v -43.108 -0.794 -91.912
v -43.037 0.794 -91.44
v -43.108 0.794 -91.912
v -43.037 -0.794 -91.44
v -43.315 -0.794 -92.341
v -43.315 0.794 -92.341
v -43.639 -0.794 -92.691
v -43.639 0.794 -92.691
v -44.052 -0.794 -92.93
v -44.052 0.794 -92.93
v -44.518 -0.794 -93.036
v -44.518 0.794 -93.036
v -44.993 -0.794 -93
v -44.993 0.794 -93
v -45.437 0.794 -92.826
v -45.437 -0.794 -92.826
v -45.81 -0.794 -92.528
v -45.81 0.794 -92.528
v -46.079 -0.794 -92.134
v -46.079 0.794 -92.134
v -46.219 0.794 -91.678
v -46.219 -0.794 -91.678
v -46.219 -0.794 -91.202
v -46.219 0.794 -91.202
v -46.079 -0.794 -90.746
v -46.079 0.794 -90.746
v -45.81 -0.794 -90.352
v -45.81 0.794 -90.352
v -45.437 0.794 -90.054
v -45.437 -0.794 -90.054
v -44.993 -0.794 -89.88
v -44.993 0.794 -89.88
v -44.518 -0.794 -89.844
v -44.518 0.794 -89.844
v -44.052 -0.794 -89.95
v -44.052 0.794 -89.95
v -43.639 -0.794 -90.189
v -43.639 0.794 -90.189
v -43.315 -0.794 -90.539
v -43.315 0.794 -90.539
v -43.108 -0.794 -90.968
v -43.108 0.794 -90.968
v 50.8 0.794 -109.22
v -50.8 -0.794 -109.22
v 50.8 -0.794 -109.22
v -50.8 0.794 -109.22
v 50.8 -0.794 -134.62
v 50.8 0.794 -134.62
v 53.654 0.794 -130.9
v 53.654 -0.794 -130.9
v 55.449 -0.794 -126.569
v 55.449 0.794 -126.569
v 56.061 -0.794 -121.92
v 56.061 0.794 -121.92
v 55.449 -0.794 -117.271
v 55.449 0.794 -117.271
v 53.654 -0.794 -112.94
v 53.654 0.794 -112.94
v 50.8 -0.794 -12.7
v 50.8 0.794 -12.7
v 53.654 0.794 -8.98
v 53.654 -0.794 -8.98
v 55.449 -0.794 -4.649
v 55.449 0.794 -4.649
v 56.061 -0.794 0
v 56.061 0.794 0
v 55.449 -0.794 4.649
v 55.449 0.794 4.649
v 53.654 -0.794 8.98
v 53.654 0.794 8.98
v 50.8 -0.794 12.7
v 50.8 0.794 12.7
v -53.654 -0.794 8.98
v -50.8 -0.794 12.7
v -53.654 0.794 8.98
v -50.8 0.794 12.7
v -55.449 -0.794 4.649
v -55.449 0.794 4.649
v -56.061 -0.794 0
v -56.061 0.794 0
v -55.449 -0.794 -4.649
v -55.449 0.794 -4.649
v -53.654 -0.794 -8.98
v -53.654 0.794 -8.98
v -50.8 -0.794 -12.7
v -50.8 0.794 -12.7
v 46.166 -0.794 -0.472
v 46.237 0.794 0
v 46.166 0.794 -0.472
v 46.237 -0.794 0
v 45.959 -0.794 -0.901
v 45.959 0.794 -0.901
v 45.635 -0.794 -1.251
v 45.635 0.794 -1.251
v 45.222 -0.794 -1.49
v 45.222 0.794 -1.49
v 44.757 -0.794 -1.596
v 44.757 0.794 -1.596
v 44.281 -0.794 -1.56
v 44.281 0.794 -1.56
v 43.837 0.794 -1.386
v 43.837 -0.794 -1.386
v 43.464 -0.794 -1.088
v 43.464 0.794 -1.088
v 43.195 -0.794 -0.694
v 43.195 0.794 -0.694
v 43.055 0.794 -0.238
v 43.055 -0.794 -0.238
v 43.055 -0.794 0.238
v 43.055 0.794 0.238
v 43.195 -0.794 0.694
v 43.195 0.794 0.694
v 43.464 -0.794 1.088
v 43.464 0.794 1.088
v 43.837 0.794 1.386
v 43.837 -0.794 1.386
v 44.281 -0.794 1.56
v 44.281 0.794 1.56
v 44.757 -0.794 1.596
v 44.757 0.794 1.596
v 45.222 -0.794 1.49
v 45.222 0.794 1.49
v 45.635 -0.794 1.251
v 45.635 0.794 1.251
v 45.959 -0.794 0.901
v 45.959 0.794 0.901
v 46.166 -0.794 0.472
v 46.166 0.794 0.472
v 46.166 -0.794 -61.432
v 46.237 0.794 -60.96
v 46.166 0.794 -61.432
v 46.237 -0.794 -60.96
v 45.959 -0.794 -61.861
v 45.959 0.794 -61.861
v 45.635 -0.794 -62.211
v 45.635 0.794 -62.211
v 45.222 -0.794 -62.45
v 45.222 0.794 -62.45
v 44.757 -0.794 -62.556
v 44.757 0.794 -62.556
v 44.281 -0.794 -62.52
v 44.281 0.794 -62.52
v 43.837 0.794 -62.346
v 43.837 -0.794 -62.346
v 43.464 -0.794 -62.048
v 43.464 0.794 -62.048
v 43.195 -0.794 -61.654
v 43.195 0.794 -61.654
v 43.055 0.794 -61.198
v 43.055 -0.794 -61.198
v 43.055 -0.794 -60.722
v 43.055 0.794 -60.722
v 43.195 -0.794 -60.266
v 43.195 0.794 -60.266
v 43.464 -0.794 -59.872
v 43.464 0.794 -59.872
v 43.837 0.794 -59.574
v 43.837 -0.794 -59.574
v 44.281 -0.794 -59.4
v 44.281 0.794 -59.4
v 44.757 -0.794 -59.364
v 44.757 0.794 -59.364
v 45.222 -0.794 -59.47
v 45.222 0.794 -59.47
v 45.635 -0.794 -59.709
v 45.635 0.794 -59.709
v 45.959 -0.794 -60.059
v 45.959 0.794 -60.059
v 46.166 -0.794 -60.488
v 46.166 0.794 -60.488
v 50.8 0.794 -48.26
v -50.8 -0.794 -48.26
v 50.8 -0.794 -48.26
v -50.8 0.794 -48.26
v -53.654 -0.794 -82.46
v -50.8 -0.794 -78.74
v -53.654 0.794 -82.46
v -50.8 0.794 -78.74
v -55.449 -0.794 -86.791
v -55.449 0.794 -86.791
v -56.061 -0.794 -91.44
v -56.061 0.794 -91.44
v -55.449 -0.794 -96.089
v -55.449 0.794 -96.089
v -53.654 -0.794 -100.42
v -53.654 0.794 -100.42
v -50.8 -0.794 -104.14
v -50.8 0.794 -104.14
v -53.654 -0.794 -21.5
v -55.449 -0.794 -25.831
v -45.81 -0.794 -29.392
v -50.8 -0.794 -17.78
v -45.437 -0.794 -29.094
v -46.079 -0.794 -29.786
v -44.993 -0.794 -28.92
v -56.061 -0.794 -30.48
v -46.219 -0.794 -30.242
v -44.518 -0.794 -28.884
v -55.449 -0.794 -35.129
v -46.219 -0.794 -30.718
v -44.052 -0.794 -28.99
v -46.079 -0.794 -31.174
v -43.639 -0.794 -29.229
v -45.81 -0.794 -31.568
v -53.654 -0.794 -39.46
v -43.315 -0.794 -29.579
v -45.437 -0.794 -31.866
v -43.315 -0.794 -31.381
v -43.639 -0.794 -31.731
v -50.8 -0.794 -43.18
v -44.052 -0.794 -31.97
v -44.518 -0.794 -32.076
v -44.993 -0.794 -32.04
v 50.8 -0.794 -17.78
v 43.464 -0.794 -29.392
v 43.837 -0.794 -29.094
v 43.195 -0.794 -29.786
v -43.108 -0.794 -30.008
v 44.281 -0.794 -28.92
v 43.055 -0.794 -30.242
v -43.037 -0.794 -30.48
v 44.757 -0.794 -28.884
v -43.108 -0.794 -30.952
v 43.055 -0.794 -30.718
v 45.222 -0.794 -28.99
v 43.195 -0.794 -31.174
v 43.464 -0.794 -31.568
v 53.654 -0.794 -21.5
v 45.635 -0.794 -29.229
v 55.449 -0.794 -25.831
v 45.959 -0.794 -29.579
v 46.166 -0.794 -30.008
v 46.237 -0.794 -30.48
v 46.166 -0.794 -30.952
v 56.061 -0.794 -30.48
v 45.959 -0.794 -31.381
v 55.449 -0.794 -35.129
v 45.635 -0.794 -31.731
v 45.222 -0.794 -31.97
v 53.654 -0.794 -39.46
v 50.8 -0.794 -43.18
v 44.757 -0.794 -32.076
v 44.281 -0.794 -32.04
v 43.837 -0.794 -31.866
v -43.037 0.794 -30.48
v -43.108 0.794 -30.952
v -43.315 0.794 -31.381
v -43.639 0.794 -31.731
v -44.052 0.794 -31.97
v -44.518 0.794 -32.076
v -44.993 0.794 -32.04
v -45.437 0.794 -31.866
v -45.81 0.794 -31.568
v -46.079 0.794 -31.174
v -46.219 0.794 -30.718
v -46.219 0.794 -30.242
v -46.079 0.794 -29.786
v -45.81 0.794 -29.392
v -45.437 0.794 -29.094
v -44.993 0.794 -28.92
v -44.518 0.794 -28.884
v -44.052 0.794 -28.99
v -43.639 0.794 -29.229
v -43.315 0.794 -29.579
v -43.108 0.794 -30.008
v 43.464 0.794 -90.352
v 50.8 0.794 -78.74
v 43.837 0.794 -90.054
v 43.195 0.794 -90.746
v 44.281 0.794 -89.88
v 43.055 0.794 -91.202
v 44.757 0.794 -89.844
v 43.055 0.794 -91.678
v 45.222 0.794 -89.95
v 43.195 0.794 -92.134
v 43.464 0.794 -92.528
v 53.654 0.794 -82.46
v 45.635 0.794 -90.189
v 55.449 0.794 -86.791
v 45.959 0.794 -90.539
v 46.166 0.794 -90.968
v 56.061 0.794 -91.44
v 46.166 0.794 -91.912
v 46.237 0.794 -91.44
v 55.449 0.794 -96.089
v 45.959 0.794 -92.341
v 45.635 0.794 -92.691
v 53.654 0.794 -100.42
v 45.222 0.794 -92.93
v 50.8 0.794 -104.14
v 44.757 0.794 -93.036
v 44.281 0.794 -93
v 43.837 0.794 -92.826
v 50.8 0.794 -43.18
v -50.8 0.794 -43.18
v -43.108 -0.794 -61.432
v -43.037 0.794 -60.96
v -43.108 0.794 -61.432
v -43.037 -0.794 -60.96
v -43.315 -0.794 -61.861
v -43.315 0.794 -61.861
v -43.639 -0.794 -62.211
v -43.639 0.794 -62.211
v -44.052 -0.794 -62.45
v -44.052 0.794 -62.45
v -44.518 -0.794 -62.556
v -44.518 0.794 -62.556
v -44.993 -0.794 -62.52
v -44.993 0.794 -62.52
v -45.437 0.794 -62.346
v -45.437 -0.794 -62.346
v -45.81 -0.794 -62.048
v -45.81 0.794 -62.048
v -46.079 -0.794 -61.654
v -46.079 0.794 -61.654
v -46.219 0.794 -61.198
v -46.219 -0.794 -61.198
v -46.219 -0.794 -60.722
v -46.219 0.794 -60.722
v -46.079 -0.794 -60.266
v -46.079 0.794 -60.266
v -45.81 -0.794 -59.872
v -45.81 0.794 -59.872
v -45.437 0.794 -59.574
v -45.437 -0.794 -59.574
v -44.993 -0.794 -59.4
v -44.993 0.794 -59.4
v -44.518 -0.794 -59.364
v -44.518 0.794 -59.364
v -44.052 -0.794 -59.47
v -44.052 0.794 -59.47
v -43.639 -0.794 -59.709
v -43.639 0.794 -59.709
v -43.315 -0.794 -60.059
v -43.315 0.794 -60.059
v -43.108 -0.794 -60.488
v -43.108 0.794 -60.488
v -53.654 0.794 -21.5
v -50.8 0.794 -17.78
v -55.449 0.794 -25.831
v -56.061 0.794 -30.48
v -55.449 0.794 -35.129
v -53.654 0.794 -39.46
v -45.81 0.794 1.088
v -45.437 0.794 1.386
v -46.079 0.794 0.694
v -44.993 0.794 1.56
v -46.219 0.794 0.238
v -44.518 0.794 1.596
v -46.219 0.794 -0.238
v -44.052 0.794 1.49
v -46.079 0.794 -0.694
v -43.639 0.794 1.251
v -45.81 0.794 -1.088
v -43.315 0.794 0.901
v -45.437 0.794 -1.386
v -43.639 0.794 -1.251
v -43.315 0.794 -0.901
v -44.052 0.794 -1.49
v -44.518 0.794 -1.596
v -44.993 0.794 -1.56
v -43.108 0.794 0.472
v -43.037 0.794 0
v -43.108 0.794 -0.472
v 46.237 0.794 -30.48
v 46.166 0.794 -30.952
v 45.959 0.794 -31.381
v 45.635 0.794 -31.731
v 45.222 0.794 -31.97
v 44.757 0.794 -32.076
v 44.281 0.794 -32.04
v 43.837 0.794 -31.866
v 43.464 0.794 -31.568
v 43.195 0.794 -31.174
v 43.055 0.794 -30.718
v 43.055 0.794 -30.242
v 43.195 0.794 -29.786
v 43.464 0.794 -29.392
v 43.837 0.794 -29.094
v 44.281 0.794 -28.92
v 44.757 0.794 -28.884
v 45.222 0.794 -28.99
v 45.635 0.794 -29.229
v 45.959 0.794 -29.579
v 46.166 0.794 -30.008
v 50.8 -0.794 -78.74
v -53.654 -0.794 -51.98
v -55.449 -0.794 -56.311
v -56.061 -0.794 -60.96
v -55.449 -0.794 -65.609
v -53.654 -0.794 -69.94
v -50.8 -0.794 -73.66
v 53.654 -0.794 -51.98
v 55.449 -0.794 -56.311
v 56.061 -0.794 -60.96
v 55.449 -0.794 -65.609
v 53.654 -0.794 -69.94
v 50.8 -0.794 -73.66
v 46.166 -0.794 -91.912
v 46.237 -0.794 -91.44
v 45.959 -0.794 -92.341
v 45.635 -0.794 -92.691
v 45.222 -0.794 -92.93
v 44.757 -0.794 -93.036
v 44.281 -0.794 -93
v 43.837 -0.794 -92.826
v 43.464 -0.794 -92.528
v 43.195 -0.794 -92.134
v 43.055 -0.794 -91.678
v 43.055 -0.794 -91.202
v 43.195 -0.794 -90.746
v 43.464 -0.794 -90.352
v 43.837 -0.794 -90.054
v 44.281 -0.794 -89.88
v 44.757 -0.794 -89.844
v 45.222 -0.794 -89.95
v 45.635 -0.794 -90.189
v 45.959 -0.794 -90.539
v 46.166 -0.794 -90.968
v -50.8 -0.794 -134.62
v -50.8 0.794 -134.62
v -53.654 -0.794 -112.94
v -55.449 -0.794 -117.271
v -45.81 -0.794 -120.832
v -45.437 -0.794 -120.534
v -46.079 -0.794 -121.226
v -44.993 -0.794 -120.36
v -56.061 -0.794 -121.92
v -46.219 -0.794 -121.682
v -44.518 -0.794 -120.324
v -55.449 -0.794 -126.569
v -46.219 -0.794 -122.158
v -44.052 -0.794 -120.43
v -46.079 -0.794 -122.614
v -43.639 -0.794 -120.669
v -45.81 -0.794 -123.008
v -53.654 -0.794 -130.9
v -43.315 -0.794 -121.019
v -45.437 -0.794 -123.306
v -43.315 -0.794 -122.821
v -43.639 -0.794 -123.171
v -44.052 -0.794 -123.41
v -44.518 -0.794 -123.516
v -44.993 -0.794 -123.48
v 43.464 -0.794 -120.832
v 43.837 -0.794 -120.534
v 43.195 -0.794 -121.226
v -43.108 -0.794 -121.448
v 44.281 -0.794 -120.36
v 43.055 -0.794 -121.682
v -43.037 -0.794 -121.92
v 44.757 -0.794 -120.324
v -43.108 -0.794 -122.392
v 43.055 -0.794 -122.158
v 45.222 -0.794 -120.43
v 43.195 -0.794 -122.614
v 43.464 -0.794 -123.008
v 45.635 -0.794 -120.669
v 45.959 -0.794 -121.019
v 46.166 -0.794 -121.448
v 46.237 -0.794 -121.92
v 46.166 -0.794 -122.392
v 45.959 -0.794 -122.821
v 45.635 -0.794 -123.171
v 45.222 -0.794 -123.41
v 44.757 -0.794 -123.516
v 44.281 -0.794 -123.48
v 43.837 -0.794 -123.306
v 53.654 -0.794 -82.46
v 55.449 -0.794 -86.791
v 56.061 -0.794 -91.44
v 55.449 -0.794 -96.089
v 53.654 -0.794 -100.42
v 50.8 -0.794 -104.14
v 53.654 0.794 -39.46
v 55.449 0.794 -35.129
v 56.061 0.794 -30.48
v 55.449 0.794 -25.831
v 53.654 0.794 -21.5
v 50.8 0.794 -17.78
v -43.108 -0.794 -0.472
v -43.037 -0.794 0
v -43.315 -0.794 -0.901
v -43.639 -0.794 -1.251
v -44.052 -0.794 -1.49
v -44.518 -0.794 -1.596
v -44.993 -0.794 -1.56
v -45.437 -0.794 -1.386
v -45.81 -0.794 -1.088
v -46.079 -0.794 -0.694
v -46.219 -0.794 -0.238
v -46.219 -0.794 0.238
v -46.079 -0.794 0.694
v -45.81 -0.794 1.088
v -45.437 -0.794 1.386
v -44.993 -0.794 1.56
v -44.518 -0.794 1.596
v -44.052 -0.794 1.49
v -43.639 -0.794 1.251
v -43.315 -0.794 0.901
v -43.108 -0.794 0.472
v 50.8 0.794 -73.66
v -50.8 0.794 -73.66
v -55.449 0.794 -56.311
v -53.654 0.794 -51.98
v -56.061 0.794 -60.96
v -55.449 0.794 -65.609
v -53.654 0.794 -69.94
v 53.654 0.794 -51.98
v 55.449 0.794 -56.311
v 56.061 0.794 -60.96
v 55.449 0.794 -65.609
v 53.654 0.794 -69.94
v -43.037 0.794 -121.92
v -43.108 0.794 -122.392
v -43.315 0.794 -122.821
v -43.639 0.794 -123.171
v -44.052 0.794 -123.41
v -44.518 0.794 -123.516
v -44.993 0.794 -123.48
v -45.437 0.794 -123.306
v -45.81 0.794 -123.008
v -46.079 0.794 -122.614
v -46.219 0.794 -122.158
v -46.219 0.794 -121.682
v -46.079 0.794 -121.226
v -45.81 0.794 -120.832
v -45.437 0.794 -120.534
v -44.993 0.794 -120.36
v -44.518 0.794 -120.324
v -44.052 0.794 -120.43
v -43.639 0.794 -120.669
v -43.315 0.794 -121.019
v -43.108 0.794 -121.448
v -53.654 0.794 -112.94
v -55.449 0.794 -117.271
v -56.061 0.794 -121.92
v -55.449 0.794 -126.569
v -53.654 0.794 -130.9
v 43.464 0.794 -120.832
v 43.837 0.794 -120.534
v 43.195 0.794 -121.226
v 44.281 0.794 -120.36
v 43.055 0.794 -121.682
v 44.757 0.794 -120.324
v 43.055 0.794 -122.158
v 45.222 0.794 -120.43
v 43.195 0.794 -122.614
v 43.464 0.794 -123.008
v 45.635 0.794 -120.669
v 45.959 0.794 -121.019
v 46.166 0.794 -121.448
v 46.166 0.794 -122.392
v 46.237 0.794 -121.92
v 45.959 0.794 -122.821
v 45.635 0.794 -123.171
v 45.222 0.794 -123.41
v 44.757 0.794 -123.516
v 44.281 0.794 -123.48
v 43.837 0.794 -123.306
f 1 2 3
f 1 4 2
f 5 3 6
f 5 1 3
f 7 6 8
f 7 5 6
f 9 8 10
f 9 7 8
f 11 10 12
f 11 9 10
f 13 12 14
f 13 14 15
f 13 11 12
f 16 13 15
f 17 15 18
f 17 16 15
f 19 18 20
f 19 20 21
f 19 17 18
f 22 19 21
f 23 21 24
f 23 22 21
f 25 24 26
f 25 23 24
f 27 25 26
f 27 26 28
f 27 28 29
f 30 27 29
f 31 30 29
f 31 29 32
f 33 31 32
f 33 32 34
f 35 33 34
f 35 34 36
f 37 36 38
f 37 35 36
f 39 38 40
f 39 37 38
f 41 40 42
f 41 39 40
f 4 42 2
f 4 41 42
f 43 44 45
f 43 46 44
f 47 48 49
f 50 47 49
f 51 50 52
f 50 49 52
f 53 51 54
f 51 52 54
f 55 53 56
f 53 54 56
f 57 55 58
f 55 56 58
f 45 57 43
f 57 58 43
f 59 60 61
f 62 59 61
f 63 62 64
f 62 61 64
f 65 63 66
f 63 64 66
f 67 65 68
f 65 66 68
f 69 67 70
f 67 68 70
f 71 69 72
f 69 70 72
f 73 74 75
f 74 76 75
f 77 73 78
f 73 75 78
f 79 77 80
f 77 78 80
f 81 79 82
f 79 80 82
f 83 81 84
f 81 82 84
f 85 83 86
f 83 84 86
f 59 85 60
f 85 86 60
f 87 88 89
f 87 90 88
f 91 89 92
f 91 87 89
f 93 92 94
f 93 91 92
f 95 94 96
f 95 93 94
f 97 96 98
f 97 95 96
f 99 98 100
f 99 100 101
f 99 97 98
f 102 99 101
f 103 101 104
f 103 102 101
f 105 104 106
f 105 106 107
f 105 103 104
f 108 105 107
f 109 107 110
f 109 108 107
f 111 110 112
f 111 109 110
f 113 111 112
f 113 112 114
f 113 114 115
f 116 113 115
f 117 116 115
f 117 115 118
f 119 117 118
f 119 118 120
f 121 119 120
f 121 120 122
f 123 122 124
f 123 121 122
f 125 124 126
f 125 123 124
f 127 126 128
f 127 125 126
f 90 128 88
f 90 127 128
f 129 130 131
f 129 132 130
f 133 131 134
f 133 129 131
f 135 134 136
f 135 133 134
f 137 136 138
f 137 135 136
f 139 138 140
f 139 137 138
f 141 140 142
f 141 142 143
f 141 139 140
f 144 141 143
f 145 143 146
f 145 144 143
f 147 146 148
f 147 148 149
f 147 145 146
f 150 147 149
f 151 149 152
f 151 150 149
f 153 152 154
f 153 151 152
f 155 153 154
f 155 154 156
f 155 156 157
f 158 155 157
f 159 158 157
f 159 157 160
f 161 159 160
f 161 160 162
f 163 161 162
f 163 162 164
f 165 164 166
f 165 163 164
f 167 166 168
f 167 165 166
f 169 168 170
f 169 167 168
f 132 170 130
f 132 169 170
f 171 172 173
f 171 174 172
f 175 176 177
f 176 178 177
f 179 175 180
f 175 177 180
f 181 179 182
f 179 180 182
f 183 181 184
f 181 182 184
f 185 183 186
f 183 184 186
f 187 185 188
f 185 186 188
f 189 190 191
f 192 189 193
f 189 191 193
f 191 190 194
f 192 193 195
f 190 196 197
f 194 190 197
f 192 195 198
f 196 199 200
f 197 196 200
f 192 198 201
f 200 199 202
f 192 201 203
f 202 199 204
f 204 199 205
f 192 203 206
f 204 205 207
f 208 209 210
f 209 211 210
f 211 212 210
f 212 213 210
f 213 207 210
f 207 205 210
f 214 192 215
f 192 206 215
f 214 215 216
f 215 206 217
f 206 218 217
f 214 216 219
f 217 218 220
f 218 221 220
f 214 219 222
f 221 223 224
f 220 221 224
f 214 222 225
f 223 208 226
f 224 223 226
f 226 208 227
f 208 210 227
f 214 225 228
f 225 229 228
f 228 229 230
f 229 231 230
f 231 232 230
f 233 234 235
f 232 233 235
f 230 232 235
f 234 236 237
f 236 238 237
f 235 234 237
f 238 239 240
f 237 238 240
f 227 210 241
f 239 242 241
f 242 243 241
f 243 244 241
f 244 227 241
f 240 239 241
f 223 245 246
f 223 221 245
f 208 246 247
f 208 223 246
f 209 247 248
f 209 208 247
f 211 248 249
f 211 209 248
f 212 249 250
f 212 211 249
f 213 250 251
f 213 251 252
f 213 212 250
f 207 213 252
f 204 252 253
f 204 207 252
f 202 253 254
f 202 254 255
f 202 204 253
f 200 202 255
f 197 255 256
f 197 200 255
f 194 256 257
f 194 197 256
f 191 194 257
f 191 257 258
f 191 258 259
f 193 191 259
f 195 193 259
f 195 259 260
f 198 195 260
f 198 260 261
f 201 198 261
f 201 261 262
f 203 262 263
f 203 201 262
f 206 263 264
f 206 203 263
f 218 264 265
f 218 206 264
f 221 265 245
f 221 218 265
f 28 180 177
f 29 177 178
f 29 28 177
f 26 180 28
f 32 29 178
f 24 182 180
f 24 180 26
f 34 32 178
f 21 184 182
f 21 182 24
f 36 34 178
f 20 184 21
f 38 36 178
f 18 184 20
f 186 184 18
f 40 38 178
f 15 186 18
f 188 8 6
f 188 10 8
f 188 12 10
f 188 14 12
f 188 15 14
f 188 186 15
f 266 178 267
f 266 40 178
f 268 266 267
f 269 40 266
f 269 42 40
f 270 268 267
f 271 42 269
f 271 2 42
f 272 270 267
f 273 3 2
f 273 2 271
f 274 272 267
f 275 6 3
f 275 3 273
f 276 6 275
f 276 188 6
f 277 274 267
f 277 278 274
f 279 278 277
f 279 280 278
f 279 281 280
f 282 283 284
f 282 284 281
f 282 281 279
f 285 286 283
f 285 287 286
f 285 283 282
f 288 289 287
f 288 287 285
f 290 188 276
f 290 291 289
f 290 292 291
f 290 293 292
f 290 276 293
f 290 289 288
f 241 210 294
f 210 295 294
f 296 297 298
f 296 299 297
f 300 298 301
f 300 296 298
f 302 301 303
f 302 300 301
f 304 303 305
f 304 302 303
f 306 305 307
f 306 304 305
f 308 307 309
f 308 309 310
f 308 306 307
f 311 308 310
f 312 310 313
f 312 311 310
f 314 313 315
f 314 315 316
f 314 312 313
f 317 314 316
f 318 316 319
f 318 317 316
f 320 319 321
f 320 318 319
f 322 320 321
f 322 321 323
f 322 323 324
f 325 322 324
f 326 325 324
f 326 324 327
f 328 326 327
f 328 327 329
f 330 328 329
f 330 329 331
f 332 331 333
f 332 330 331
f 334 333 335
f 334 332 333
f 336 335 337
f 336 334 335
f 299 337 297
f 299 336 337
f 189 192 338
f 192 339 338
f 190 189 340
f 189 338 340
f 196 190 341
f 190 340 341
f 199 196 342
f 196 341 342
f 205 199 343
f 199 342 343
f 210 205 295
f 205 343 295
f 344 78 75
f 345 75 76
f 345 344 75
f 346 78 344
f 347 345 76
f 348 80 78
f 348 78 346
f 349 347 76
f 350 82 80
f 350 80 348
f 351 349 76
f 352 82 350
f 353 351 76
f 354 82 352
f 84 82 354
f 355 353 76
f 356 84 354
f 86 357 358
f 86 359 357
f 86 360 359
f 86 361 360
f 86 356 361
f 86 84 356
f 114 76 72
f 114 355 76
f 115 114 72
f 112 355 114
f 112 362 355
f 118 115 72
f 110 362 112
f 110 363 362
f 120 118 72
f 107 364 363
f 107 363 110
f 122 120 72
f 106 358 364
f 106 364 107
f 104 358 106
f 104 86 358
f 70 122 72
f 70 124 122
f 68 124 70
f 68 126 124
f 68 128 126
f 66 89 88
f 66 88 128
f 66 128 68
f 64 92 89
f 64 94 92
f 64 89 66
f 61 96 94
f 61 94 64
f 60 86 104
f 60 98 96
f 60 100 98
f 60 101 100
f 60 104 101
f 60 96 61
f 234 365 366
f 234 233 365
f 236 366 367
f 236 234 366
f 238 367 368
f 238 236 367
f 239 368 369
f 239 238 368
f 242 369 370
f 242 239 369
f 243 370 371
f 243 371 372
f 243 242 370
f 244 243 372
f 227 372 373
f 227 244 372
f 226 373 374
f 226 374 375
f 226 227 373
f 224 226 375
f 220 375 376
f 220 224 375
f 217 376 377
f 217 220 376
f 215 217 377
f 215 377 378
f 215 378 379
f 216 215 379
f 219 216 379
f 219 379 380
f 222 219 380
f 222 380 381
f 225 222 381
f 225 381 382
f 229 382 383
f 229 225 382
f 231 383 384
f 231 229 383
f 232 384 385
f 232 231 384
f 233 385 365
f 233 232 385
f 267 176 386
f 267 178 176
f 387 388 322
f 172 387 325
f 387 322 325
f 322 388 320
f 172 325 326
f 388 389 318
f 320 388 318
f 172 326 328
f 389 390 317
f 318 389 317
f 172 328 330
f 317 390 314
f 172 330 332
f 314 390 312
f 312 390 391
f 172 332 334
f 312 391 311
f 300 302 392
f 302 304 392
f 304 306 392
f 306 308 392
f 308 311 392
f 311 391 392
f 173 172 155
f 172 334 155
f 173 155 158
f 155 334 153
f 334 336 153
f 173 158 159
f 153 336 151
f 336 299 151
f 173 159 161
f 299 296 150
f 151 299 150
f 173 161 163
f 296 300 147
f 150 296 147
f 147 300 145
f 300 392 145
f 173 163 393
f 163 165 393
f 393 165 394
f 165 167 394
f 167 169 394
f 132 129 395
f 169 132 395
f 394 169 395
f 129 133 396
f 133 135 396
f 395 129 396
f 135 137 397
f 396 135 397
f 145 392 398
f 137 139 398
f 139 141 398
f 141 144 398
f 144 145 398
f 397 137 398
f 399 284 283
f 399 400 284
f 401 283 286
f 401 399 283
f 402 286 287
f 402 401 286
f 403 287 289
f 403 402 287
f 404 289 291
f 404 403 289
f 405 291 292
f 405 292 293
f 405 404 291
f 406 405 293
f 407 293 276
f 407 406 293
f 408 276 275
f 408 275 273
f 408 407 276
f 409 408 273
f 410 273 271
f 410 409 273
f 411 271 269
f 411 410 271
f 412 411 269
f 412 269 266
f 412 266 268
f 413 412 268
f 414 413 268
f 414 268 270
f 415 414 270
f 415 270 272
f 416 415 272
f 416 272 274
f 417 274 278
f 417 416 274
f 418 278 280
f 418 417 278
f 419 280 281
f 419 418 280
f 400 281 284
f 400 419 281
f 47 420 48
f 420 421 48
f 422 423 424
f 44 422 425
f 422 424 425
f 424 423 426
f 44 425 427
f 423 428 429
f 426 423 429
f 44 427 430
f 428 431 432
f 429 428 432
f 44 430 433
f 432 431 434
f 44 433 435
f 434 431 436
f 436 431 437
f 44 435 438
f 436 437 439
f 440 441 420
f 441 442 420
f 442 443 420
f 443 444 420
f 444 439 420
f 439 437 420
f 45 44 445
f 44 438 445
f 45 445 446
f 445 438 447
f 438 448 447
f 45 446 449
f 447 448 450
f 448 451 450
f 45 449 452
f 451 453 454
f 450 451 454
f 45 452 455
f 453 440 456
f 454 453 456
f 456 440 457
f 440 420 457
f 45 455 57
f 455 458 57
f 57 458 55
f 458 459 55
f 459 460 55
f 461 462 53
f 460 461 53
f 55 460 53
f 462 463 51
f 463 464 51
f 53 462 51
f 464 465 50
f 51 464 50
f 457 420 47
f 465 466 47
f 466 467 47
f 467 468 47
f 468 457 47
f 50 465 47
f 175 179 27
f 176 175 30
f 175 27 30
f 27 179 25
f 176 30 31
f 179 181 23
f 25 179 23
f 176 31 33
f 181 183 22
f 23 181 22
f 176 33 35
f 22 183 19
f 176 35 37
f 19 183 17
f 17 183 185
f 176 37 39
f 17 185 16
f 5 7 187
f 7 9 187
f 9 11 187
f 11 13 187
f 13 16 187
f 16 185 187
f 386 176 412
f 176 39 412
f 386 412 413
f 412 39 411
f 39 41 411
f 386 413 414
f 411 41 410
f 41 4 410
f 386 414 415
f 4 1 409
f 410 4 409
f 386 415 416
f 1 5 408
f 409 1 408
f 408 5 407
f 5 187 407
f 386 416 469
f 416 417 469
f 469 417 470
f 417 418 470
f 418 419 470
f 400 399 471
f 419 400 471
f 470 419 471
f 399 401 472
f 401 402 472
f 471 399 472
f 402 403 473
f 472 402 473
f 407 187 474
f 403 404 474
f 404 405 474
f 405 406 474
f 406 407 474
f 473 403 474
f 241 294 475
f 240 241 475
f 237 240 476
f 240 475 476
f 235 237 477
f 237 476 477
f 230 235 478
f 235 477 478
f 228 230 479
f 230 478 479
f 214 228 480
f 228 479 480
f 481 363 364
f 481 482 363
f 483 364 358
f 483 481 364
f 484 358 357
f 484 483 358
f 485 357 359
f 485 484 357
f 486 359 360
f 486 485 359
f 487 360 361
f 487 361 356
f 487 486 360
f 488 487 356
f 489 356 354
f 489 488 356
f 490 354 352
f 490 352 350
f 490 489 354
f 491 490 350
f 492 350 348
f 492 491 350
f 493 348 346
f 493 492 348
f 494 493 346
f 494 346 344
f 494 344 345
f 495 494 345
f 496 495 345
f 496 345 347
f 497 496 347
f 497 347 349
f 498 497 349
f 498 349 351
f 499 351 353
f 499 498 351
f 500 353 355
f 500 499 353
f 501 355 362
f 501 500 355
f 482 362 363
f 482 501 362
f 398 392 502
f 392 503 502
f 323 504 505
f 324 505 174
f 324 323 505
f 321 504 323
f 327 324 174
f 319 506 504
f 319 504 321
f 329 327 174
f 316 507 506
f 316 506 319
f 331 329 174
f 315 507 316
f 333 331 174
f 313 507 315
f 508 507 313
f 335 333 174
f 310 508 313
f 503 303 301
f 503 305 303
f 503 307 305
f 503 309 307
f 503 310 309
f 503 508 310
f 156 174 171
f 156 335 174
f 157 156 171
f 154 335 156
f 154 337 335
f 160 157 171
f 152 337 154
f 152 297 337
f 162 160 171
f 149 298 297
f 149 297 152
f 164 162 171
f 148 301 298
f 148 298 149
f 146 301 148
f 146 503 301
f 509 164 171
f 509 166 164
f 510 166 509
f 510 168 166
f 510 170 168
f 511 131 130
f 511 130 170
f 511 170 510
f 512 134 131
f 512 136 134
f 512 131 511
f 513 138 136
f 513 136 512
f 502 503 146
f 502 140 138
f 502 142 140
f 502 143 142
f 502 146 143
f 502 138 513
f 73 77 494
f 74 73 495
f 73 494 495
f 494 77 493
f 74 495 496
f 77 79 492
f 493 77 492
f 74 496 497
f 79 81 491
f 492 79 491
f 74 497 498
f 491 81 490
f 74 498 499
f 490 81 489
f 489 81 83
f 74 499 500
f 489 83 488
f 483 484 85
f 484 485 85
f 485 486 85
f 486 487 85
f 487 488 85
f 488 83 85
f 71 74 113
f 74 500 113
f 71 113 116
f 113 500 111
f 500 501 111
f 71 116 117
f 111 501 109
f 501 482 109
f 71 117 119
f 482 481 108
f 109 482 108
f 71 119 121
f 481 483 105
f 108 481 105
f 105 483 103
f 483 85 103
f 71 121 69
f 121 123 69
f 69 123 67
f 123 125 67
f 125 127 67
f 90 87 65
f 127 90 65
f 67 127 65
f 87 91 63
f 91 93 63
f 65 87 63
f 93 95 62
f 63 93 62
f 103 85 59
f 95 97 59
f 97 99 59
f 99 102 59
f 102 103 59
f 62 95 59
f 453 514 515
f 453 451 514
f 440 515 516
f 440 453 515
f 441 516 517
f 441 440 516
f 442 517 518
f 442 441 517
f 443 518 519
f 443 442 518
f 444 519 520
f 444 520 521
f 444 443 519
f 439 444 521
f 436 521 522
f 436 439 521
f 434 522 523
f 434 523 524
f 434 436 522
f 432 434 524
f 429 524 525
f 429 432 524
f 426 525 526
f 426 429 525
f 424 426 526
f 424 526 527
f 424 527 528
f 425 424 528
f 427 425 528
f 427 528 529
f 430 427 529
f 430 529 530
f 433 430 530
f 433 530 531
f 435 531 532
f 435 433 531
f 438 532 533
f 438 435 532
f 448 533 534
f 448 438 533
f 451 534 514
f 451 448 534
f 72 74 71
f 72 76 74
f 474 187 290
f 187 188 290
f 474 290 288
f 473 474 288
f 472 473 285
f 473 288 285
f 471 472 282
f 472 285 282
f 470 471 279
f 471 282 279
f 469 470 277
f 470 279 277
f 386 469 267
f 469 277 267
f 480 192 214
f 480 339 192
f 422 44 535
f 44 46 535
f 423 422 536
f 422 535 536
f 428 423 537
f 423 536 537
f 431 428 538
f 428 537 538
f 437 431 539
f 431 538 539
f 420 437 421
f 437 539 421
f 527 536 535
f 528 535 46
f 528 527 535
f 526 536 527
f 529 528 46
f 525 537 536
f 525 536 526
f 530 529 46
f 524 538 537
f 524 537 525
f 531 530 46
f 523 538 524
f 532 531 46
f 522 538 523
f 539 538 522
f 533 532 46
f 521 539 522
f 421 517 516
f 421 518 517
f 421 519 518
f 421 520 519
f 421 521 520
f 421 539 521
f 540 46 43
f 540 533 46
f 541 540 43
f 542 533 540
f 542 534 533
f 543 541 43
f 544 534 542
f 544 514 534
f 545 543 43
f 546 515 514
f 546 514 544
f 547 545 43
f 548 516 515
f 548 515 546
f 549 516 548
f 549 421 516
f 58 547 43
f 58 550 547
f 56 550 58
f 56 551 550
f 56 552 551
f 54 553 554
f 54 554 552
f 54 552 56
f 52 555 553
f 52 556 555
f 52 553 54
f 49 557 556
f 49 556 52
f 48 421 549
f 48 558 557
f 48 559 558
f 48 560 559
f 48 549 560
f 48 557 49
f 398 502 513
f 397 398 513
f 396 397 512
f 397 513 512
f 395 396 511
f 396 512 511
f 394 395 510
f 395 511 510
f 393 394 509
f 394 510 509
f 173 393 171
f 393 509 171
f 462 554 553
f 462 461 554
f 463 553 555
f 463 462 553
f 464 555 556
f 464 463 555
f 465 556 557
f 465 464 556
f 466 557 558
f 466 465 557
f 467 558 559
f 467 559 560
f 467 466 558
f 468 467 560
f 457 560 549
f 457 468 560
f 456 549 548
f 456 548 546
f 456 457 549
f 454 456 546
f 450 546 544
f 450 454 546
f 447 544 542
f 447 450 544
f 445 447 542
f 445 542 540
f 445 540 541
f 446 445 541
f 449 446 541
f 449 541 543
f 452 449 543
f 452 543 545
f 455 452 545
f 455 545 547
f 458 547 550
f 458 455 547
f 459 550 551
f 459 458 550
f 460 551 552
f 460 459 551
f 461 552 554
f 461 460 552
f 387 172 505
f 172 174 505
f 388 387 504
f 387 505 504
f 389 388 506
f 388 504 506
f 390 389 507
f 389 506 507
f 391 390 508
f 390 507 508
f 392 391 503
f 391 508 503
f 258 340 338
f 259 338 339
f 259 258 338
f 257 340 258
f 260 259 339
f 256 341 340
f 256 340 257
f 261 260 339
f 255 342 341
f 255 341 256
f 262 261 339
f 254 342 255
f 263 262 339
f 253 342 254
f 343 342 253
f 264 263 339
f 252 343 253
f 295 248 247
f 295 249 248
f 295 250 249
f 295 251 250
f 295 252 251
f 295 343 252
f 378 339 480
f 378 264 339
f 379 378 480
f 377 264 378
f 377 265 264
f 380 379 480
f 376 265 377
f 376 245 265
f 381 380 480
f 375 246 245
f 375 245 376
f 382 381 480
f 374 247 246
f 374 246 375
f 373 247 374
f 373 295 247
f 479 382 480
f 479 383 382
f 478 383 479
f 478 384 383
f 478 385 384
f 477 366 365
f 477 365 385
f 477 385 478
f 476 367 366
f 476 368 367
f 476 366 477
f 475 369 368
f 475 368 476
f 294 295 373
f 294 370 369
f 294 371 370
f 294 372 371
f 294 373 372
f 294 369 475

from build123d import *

# Parameters (mm, degrees)
SKETCH1_W           = 101.6
SKETCH1_H           = 25.4
SKETCH1_R           = 1.6002
BOSS_EXTRUDE1_DEPTH = 0.79375
LPATTERN1_COUNT     = 5
LPATTERN1_PITCH     = 30.48


with BuildPart() as part:
    # Sketch1 → Boss-Extrude1 (new body, symmetric)
    with BuildSketch(Plane(origin=(0, 0, 0), x_dir=(1, 0, 0), z_dir=(0, 1, 0))):
        Rectangle(SKETCH1_W, SKETCH1_H)
        with Locations((-44.637105686, 0)):
            Circle(SKETCH1_R, mode=Mode.SUBTRACT)
        with Locations((44.637105686, 0)):
            Circle(SKETCH1_R, mode=Mode.SUBTRACT)
        with BuildLine():
            ThreePointArc((-50.8, -12.7), (-56.060512242, 0), (-50.8, 12.7))
            Line((-50.8, 12.7), (-50.8, -12.7))
        make_face()
        with BuildLine():
            ThreePointArc((50.8, 12.7), (56.060512242, 0), (50.8, -12.7))
            Line((50.8, -12.7), (50.8, 12.7))
        make_face()
    extrude(amount=BOSS_EXTRUDE1_DEPTH, both=True)


with BuildPart() as lpattern1_1:
    # LPattern1: pattern copy
    add(part.part.moved(Location(Vector(0, 0, -1) * (1 * LPATTERN1_PITCH))))


with BuildPart() as lpattern1_2:
    # LPattern1: pattern copy
    add(part.part.moved(Location(Vector(0, 0, -1) * (2 * LPATTERN1_PITCH))))


with BuildPart() as lpattern1_3:
    # LPattern1: pattern copy
    add(part.part.moved(Location(Vector(0, 0, -1) * (3 * LPATTERN1_PITCH))))


with BuildPart() as lpattern1_4:
    # LPattern1: pattern copy
    add(part.part.moved(Location(Vector(0, 0, -1) * (4 * LPATTERN1_PITCH))))


solid = Compound([part.part, lpattern1_1.part, lpattern1_2.part, lpattern1_3.part, lpattern1_4.part])
